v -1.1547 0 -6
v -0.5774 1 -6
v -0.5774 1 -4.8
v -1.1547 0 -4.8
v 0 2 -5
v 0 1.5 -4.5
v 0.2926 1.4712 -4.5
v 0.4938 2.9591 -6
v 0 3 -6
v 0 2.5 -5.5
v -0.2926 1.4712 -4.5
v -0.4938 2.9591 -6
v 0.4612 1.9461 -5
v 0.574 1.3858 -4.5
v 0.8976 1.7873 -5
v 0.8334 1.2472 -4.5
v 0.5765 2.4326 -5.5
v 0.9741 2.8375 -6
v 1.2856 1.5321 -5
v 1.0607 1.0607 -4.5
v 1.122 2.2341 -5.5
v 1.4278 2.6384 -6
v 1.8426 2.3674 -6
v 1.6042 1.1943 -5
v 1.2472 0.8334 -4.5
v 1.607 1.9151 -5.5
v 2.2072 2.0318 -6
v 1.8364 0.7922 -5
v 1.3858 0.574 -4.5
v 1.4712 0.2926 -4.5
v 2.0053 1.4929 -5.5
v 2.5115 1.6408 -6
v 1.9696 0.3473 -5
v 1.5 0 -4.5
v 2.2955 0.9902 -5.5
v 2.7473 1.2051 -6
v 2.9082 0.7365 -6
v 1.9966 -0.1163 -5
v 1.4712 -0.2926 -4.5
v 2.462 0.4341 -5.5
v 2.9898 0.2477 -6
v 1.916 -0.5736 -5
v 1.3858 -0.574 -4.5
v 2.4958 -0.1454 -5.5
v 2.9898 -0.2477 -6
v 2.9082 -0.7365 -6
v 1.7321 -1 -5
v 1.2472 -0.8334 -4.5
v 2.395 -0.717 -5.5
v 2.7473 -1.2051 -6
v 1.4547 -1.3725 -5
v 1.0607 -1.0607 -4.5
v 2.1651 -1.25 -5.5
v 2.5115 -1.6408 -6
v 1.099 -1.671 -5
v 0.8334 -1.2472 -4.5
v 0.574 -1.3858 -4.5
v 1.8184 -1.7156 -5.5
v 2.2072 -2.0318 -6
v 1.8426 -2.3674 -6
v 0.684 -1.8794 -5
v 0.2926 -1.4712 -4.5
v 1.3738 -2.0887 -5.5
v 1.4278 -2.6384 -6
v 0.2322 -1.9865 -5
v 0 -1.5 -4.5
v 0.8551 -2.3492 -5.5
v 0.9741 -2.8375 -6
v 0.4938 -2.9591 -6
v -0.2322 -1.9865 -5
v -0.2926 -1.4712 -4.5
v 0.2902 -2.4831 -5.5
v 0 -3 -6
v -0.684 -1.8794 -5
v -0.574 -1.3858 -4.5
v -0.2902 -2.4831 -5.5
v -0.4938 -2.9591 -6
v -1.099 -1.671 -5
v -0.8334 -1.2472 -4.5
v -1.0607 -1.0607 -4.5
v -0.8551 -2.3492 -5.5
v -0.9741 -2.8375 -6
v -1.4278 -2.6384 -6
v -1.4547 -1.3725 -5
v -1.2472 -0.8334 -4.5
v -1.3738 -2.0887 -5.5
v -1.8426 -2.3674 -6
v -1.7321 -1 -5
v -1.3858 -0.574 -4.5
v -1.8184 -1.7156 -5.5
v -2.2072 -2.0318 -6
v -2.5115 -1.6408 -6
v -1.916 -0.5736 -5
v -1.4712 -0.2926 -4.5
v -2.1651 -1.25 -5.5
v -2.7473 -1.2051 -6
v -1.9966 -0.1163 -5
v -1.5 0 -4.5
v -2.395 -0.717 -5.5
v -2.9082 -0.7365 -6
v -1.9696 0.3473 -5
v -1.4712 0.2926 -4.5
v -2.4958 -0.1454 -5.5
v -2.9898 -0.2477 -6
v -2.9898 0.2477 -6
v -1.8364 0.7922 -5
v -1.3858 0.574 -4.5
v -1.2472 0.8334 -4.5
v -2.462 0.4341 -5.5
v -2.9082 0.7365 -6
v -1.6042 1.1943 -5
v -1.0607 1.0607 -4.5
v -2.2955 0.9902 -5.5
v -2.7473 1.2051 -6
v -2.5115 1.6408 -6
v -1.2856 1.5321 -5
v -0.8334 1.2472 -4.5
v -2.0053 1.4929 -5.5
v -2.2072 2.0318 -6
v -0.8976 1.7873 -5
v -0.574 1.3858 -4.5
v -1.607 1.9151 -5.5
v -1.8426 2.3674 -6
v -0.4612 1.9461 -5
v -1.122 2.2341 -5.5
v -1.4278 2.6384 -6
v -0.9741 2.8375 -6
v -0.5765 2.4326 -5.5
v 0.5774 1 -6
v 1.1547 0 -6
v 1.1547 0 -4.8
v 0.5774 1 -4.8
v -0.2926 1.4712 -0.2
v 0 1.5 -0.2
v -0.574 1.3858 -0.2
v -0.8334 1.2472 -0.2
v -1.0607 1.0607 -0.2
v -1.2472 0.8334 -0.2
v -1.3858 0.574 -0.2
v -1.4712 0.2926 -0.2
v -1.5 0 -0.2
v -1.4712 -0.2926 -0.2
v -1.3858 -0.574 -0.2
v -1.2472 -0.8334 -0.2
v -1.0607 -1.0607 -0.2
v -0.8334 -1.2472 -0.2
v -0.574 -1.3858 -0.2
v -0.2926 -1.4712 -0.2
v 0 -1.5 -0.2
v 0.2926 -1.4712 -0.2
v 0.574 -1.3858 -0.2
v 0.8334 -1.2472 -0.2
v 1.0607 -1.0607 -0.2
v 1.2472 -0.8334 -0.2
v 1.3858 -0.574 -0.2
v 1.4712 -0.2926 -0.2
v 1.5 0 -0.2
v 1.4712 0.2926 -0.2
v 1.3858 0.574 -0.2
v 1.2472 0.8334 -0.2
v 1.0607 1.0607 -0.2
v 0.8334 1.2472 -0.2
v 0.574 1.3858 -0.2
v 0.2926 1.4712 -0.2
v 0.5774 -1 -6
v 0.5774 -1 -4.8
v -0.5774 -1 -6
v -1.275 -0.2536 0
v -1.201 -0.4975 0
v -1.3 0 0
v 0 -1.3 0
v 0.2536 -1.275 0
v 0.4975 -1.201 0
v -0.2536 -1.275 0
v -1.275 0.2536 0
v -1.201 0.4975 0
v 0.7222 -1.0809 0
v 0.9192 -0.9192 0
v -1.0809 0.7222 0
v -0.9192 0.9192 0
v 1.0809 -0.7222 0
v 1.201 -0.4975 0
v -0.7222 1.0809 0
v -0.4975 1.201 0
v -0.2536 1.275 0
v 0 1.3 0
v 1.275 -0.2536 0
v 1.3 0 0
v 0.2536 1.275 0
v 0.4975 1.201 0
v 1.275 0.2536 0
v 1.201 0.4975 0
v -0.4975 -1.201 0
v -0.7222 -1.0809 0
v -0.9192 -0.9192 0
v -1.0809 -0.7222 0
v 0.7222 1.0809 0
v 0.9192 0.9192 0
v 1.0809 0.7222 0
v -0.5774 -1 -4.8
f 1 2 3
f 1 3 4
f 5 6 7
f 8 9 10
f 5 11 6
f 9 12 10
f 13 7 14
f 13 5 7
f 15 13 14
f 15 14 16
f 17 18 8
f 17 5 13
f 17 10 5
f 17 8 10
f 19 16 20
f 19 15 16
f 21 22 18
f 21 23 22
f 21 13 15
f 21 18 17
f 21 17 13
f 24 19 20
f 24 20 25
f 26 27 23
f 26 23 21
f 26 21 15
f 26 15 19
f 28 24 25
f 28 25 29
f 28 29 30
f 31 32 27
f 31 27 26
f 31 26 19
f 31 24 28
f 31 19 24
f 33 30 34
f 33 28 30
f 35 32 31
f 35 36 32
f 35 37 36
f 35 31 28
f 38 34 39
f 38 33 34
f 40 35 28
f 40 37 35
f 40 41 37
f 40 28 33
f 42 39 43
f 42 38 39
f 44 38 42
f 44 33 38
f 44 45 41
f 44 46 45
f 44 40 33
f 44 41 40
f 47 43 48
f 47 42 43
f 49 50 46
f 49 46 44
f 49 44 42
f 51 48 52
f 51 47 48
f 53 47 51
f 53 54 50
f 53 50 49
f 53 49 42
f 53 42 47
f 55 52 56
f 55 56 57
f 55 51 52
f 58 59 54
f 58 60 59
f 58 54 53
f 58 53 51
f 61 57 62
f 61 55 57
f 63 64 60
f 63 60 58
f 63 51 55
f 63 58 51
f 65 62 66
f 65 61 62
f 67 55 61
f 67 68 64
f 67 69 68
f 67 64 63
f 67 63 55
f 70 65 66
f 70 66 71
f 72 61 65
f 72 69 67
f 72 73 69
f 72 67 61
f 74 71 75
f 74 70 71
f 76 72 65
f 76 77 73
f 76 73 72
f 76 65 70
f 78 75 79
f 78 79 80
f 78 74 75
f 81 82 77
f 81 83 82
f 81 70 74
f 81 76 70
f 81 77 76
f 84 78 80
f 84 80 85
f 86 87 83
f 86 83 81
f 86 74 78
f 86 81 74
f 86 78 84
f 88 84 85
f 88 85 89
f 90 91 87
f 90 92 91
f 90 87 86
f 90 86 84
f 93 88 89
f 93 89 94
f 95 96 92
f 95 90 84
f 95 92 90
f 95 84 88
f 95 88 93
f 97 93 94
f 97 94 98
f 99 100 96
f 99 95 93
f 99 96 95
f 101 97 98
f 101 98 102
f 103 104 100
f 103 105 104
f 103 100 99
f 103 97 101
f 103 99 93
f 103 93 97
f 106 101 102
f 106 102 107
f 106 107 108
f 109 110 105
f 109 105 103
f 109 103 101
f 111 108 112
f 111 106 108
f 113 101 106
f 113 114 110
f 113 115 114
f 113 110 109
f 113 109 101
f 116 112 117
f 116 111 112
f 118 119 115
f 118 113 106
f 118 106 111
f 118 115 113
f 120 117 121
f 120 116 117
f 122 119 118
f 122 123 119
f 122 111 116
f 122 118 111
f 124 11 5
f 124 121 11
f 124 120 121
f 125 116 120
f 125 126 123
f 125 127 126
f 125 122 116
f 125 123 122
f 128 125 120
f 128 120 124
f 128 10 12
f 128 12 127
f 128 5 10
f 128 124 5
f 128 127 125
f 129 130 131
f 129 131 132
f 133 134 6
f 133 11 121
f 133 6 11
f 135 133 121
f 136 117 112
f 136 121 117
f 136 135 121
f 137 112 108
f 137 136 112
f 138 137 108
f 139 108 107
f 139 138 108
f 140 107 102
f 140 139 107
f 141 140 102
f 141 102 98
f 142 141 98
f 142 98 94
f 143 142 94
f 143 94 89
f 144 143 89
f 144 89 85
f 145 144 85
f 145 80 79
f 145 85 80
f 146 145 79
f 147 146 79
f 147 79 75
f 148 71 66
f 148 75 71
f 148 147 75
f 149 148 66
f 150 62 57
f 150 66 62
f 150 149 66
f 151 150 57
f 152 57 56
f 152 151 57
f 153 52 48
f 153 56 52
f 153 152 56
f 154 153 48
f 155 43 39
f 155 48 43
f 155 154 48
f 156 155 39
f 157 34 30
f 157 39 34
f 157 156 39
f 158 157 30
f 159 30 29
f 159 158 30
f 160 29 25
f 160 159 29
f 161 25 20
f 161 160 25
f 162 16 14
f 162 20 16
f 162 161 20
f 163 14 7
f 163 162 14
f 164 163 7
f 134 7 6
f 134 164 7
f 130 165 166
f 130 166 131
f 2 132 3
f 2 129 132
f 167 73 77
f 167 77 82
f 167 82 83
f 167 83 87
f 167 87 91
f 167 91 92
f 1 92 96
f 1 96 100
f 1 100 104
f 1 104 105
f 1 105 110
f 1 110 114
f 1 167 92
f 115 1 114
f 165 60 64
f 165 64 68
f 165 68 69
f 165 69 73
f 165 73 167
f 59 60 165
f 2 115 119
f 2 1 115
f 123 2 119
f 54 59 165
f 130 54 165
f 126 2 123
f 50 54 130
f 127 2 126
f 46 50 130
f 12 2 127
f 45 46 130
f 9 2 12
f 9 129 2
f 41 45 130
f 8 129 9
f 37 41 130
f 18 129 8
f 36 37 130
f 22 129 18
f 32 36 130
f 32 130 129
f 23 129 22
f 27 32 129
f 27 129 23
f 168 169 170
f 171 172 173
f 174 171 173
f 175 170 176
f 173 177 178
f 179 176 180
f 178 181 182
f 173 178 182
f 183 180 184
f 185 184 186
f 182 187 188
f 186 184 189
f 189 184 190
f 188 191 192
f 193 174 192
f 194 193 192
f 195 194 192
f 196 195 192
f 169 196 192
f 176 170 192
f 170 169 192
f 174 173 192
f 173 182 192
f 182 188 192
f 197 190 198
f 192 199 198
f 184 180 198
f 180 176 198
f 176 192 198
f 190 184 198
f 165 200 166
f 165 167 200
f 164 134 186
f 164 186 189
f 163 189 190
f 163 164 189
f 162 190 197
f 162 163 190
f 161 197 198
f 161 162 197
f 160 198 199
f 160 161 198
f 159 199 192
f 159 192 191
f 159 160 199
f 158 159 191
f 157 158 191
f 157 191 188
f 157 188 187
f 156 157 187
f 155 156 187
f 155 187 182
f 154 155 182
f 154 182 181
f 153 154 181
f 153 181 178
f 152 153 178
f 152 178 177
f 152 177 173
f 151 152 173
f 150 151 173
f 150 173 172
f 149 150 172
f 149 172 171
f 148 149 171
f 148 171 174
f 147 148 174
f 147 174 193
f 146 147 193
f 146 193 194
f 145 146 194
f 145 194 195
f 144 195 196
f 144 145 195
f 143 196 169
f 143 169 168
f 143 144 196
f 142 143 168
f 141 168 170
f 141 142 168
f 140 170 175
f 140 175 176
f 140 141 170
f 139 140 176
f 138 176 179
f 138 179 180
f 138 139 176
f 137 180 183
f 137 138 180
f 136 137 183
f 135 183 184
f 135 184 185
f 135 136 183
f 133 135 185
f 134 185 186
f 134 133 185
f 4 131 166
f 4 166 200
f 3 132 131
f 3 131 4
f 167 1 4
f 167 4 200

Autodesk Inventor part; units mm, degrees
ref_plane "YZ Plane" through (0, 0, 0) normal (1, 0, 0) x (0, 1, 0)
ref_plane "XZ Plane" through (0, 0, 0) normal (0, 1, 0) x (-1, 0, 0)
ref_plane "XY Plane" through (0, 0, 0) normal (0, 0, 1) x (1, 0, 0)
sketch "Sketch4" plane through (0, 0, 0) normal (1, 0, 0) x (0, 1, 0)
  line L0 (0, 0) -> (0, -6)
  line L1 (0, -6) -> (3, -6)
  line L2 (3, -6) -> (1.5, -4.5)
  line L3 (1.5, -4.5) -> (1.5, 0)
  line L4 (1.5, 0) -> (0, 0)
  dimension "d11" = 6
  dimension "d12" = 3
  dimension "d15" = 6
  dimension "d16" = 45
revolve "Revolution1" add sketch "Sketch4" angle 360 about axis through (0, 0, 0) along (0, 0, -1)
sketch "Sketch5" plane through (0, 0, -6) normal (0, 0, -1) x (-1, 0, 0)
  line L0 (1.1547, 0) -> (0.5774, -1)
  line L1 (0.5774, -1) -> (-0.5774, -1)
  line L2 (-0.5774, -1) -> (-1.1547, 0)
  line L3 (-1.1547, 0) -> (-0.5774, 1)
  line L4 (-0.5774, 1) -> (0.5774, 1)
  line L5 (0.5774, 1) -> (1.1547, 0)
  point P0 (0, 0)
  point P1 (0, 0)
  dimension "d18" = 2
extrude "Extrusion5" cut sketch "Sketch5" against normal blind 1.2
chamfer "Chamfer2" distance 0.2 angle 45 1 edges at (0, -1.5, 0)
thread "Thread1" size "M3x0.5" class "6g" standard "ANSI Metric M Profile" full length
properties part number "M3 x 6 mm FHCS" material "Stainless Steel"
